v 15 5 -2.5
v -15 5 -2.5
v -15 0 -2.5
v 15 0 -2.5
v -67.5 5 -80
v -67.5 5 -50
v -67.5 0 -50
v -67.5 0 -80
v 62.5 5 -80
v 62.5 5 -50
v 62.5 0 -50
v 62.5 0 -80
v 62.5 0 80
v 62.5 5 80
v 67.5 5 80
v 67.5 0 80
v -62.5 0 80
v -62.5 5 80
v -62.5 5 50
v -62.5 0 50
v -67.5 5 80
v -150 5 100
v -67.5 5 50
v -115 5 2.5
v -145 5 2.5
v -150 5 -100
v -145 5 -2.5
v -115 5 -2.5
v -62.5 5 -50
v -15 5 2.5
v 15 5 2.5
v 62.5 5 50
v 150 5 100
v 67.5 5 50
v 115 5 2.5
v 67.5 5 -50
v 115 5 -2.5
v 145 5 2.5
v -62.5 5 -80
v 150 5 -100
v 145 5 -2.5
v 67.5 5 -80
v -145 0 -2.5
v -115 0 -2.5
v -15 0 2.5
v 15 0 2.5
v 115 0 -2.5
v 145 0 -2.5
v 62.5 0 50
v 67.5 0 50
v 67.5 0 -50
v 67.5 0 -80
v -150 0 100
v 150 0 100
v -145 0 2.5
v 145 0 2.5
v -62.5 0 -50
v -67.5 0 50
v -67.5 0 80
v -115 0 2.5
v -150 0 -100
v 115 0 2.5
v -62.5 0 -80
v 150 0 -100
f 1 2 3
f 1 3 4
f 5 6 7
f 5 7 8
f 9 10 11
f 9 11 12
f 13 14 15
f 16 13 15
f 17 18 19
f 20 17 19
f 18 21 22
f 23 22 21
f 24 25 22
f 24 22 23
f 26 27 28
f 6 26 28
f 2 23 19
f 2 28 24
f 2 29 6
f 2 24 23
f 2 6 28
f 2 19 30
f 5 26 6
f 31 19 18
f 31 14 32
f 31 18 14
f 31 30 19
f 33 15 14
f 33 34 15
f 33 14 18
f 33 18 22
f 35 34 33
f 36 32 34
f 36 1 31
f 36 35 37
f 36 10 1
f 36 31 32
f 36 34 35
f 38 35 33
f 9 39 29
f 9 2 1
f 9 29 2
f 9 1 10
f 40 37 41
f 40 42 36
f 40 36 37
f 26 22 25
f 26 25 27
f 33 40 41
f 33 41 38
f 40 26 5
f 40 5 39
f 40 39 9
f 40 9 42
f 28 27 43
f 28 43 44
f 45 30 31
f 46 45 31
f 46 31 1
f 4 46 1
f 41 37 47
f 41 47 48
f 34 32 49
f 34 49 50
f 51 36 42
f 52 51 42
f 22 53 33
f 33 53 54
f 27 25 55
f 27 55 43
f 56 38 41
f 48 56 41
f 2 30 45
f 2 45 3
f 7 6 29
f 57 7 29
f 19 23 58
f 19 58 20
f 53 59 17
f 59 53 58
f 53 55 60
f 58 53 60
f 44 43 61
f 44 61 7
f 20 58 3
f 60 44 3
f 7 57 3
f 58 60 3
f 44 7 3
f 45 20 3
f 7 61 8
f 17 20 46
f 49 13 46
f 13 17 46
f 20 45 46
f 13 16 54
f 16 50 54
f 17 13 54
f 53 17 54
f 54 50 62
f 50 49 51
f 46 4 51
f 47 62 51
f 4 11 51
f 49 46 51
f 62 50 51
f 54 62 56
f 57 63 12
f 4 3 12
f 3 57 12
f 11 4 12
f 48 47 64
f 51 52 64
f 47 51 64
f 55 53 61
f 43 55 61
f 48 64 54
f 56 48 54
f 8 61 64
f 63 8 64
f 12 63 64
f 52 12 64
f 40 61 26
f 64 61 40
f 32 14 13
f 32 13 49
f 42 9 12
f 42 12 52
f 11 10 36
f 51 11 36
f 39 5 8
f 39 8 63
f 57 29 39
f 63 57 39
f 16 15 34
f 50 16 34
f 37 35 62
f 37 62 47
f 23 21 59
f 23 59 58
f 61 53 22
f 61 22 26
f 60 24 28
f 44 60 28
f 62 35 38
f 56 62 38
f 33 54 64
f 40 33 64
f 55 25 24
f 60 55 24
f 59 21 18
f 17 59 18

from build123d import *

# Parameters (mm, degrees)
SKETCH1_W           = 300
SKETCH1_H           = 200
BOSS_EXTRUDE1_DEPTH = 5
SKETCH2_W           = 30
SKETCH2_H           = 5
SKETCH2_W_2         = 5
SKETCH2_H_2         = 30
CUT_EXTRUDE1_DEPTH  = 5


with BuildPart() as part:
    # Sketch1 → Boss-Extrude1 (new body)
    with BuildSketch(Plane(origin=(0, 0, 0), x_dir=(1, 0, 0), z_dir=(0, 1, 0))):
        Rectangle(SKETCH1_W, SKETCH1_H)
    extrude(amount=BOSS_EXTRUDE1_DEPTH)

    # Sketch2 → Cut-Extrude1 (cut)
    with BuildSketch(Plane(origin=(0, 5, 0), x_dir=(1, 0, 0), z_dir=(0, 1, 0))):
        with Locations((-130, 0)):
            Rectangle(SKETCH2_W, SKETCH2_H)
        with Locations((130, 0)):
            Rectangle(SKETCH2_W, SKETCH2_H)
        with Locations((-65, 65)):
            Rectangle(SKETCH2_W_2, SKETCH2_H_2)
        with Locations((-65, -65)):
            Rectangle(SKETCH2_W_2, SKETCH2_H_2)
        with Locations((65, 65)):
            Rectangle(SKETCH2_W_2, SKETCH2_H_2)
        with Locations((65, -65)):
            Rectangle(SKETCH2_W_2, SKETCH2_H_2)
        Rectangle(SKETCH2_W, SKETCH2_H)
    extrude(amount=-CUT_EXTRUDE1_DEPTH, mode=Mode.SUBTRACT)


solid = part.part
